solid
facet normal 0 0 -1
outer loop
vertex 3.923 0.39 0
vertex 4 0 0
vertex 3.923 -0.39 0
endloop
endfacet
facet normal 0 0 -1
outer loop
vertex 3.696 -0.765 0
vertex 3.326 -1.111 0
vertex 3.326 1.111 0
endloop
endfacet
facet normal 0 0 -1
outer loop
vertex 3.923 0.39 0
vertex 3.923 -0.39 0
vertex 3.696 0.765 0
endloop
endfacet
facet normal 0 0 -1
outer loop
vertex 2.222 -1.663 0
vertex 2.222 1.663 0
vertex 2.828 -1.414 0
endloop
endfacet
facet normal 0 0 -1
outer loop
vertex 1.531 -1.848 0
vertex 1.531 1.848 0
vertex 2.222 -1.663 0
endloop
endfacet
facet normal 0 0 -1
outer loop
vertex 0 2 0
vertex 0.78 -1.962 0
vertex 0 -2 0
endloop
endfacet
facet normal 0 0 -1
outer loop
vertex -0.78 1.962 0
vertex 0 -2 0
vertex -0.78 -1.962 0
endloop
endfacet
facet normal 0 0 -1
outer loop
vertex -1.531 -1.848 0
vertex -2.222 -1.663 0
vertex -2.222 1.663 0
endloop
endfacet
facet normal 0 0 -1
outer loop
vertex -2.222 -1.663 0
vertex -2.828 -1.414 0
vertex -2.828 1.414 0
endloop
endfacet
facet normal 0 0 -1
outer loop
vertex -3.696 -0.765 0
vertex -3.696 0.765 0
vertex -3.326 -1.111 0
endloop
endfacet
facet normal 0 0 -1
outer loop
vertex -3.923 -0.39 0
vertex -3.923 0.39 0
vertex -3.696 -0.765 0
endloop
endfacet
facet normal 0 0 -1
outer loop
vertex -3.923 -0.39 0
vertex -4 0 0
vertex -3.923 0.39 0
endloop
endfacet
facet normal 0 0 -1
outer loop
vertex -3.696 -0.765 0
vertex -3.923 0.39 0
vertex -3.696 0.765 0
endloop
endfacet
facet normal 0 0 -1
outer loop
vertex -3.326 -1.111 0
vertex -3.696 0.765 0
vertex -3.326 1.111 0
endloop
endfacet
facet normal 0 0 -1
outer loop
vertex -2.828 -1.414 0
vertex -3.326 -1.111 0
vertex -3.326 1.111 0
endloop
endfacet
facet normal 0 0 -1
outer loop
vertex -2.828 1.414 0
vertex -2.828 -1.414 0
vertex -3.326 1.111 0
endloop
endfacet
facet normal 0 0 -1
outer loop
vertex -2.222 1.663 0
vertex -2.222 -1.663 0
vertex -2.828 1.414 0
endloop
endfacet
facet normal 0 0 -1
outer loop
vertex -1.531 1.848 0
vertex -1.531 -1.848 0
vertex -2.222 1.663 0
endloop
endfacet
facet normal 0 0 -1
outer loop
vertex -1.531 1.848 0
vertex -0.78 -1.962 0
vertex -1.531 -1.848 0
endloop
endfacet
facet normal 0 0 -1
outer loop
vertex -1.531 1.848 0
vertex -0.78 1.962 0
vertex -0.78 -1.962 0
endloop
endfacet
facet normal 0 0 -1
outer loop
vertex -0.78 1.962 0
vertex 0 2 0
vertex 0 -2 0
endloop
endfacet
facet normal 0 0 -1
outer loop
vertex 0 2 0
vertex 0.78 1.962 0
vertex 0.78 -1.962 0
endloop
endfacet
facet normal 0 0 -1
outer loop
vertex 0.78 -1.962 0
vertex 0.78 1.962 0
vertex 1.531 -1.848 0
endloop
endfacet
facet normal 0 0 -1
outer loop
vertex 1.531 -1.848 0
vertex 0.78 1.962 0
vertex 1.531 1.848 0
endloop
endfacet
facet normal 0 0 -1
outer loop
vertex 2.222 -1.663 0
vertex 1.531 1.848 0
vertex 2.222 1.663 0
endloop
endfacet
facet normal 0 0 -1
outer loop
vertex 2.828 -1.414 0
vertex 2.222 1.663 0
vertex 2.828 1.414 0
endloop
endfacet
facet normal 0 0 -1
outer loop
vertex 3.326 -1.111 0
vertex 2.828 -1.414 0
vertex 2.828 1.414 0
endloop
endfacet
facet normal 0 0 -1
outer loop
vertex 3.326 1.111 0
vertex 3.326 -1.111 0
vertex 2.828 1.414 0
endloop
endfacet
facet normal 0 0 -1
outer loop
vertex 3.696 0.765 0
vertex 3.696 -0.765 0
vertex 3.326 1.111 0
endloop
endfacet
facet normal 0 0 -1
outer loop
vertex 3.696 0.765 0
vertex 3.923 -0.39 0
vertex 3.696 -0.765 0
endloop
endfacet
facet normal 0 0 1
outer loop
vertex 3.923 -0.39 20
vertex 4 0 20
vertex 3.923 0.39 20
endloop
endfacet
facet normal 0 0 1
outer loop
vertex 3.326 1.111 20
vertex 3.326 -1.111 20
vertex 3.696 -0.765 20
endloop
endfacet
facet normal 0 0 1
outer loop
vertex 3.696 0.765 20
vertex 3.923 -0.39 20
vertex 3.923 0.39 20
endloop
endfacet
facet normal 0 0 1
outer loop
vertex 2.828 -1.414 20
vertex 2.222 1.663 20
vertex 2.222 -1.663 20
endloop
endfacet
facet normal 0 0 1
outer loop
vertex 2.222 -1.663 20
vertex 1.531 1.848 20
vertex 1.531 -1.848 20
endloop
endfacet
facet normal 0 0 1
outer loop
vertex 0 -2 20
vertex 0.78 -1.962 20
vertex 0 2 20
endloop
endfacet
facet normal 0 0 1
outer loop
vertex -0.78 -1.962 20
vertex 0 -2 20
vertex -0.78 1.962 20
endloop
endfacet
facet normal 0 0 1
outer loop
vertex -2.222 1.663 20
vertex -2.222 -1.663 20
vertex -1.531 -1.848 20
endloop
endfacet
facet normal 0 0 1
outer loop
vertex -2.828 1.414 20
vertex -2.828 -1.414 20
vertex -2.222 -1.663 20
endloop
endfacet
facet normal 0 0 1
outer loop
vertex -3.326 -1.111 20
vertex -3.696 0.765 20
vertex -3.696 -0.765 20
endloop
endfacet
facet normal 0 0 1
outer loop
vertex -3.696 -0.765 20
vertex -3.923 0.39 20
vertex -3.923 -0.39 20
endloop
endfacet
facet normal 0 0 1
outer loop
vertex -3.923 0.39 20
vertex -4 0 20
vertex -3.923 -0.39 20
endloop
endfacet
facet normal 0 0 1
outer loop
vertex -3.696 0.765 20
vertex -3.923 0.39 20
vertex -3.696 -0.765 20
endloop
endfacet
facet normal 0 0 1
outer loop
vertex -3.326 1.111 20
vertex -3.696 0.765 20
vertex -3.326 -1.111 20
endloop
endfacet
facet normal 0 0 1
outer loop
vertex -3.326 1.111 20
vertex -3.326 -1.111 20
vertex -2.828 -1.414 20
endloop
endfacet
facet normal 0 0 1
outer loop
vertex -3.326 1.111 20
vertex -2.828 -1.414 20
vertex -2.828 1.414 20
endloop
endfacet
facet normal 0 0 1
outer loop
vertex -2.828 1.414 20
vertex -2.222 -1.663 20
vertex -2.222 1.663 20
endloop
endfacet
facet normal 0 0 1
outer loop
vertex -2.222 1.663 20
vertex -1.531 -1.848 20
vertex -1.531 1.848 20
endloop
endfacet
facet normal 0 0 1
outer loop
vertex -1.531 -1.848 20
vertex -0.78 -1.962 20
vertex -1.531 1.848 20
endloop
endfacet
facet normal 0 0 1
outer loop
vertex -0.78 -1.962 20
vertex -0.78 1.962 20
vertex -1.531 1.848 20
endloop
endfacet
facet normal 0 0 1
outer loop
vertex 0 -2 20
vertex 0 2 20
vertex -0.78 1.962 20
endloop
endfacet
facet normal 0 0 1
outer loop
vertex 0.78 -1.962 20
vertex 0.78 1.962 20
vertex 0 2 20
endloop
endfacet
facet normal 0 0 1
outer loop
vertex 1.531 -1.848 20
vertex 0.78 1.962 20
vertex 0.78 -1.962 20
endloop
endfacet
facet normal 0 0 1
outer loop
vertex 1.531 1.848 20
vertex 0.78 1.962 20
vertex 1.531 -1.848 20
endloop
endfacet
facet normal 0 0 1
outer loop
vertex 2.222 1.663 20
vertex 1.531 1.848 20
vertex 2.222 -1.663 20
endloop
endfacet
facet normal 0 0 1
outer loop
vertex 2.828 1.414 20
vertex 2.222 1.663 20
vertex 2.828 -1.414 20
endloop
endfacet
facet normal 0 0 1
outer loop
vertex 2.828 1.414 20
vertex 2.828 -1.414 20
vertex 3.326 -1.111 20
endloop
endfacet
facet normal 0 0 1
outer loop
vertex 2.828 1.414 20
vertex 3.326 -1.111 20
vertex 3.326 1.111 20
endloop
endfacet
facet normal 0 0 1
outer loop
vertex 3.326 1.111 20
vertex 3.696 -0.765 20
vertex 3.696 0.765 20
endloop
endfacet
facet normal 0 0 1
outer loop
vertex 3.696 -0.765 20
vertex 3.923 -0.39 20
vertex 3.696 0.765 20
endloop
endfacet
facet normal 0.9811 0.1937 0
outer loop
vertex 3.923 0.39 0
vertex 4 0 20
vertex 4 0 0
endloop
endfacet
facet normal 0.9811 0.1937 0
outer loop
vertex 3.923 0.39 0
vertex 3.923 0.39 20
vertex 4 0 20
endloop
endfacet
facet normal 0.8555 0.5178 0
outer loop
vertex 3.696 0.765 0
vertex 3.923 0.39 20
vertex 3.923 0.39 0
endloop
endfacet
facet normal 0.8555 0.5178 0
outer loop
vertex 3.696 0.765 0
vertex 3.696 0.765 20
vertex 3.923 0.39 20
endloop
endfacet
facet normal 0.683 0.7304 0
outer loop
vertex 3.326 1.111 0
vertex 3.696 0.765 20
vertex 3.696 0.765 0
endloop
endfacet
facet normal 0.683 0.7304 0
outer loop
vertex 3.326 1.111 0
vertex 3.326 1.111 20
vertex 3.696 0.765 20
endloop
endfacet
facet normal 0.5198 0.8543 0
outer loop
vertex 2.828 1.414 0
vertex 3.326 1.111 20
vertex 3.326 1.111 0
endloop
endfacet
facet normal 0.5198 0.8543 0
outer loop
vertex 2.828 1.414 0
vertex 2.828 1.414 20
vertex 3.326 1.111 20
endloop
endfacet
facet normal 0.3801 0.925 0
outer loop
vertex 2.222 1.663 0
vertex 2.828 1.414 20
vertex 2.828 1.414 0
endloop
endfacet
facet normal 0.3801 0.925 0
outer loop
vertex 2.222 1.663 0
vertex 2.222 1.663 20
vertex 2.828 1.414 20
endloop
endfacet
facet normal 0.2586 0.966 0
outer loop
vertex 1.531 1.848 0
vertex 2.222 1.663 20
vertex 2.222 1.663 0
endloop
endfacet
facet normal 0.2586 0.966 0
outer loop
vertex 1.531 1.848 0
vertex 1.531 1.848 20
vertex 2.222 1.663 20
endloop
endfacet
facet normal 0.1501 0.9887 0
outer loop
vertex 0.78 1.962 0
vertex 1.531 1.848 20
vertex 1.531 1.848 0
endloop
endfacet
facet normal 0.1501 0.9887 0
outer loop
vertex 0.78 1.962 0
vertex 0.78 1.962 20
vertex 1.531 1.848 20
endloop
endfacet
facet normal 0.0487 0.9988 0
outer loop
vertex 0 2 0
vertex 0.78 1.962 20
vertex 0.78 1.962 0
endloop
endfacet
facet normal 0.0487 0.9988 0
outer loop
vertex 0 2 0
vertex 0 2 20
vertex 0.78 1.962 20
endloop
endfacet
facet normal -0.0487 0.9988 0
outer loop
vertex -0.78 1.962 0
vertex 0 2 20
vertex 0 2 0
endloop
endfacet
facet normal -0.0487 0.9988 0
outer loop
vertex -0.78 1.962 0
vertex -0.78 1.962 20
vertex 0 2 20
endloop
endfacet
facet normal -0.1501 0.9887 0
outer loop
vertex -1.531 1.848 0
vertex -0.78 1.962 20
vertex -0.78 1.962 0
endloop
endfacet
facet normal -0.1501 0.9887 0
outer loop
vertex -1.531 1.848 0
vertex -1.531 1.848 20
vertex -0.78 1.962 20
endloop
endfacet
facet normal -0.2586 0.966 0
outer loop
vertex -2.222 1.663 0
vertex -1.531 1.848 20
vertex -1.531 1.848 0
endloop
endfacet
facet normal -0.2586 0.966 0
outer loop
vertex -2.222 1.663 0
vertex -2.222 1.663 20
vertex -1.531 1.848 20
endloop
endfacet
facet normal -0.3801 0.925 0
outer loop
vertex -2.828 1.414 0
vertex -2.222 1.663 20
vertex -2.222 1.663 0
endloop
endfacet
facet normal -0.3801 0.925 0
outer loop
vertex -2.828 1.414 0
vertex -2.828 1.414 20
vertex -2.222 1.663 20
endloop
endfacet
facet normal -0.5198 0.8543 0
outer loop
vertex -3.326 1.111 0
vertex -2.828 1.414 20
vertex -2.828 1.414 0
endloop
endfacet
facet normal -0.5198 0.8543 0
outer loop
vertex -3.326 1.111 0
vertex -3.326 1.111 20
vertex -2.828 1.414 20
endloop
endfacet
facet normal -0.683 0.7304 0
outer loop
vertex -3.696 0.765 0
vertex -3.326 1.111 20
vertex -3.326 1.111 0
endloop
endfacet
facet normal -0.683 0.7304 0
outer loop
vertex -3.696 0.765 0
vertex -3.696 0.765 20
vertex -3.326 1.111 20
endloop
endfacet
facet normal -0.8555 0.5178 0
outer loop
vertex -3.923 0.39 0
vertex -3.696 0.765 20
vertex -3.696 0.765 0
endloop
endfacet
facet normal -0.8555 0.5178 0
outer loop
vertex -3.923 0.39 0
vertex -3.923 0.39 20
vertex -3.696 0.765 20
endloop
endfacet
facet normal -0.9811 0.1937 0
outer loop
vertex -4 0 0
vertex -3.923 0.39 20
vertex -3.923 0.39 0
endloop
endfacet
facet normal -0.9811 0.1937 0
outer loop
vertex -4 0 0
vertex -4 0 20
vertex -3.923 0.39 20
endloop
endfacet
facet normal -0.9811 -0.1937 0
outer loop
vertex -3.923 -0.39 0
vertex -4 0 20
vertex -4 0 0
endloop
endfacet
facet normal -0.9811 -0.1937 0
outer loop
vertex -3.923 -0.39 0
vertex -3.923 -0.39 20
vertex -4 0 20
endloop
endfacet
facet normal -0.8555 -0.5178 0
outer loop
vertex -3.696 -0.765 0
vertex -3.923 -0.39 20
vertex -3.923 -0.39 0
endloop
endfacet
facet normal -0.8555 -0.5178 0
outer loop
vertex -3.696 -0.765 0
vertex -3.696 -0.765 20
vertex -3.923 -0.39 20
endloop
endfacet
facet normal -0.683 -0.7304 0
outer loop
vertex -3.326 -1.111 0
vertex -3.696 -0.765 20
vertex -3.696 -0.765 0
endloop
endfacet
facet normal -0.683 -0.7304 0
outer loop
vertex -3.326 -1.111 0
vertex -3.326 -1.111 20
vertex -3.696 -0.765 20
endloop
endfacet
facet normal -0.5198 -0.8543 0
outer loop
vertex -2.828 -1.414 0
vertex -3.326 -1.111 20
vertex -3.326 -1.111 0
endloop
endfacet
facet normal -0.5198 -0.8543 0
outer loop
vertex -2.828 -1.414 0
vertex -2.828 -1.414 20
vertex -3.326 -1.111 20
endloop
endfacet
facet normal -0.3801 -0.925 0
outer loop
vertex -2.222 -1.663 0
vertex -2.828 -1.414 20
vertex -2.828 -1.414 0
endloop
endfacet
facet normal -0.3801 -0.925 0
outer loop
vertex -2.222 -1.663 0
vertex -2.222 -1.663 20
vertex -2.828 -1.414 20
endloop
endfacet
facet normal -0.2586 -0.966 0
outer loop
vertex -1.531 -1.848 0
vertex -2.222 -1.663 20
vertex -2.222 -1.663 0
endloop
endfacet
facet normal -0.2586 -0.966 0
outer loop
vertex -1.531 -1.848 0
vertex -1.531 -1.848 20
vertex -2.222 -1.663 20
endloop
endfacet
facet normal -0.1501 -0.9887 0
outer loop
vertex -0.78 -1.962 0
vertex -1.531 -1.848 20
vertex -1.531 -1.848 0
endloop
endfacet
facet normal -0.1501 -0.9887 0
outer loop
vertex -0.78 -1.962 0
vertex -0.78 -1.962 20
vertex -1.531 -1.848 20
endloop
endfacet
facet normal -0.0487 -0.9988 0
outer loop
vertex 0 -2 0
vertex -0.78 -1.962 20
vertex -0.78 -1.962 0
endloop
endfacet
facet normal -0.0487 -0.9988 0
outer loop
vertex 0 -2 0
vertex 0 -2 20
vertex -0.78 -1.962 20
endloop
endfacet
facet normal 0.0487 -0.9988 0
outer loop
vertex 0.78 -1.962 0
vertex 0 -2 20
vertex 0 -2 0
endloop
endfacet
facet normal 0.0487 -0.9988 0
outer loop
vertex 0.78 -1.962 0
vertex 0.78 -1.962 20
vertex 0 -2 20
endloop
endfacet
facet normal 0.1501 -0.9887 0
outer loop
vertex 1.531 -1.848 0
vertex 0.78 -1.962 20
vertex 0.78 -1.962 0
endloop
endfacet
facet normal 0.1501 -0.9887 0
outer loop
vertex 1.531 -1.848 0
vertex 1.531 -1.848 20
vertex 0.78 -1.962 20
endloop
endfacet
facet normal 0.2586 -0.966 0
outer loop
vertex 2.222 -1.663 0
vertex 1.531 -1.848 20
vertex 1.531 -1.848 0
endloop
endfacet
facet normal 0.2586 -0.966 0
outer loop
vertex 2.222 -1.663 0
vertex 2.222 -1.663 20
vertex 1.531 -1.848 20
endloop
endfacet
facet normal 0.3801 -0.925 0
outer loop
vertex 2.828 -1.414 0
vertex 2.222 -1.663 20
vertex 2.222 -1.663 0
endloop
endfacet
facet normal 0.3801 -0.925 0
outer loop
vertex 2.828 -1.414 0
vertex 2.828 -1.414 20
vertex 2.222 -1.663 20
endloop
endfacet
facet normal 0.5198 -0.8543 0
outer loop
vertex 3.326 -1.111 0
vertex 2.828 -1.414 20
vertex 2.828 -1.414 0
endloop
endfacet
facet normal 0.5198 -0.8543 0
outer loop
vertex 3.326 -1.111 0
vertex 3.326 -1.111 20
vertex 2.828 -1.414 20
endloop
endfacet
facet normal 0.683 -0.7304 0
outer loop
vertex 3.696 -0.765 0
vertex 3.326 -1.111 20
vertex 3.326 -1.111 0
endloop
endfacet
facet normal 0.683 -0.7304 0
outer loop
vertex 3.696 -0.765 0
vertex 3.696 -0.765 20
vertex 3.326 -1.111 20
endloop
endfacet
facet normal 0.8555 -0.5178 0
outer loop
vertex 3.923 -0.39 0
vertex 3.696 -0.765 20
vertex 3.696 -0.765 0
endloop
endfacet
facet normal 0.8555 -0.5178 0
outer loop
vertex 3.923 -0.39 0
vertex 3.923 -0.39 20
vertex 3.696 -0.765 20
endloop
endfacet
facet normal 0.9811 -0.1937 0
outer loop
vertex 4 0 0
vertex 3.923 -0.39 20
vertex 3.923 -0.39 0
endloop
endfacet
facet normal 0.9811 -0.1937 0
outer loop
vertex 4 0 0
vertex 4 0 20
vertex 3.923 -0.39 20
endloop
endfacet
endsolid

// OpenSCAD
// An ellipse drawn in 2D and extruded: the record survives the transform.
//
// scale([2, 1]) takes circle(r = 2) to the ellipse of semi-axes 4 and 2, and an
// affine map takes a circle to an ellipse exactly - the images of its centre and
// of two perpendicular radii. Until 2026-09-25 Polygon2d::transform dropped the
// circle's record there, since it was not a circle any more, and the extruded
// wall was facets. Now the record becomes an Ellipse2d, the chords are named its
// chords, and the extrusion sweeps it into an elliptic cylinder
// (SweptSurfaces.cc, extrudeConic): a circle is the ellipse whose semi-diameters
// are two perpendicular radii, so it is one derivation for both.
// EXPECT: 1 analytic surface available (0 cylindrical, 0 spherical, 0 toroidal, 0 Bezier, 1 elliptic), and 2 declared planes
// EXPECT: what decided each written facet: 32 D0, 0 D1, 0 D2, 0 D3, 0 D4
// EXPECT: 1 face round its axis between two rims closed by a seam along a ruling
// ROUNDTRIP: Plane=2 SurfaceOfExtrusion=1
//
// Derived: pi a b h = pi * 4 * 2 * 20.
// VOLUME: 502.6548246
$fn = 32;
linear_extrude(height = 20) scale([2, 1]) circle(r = 2);
